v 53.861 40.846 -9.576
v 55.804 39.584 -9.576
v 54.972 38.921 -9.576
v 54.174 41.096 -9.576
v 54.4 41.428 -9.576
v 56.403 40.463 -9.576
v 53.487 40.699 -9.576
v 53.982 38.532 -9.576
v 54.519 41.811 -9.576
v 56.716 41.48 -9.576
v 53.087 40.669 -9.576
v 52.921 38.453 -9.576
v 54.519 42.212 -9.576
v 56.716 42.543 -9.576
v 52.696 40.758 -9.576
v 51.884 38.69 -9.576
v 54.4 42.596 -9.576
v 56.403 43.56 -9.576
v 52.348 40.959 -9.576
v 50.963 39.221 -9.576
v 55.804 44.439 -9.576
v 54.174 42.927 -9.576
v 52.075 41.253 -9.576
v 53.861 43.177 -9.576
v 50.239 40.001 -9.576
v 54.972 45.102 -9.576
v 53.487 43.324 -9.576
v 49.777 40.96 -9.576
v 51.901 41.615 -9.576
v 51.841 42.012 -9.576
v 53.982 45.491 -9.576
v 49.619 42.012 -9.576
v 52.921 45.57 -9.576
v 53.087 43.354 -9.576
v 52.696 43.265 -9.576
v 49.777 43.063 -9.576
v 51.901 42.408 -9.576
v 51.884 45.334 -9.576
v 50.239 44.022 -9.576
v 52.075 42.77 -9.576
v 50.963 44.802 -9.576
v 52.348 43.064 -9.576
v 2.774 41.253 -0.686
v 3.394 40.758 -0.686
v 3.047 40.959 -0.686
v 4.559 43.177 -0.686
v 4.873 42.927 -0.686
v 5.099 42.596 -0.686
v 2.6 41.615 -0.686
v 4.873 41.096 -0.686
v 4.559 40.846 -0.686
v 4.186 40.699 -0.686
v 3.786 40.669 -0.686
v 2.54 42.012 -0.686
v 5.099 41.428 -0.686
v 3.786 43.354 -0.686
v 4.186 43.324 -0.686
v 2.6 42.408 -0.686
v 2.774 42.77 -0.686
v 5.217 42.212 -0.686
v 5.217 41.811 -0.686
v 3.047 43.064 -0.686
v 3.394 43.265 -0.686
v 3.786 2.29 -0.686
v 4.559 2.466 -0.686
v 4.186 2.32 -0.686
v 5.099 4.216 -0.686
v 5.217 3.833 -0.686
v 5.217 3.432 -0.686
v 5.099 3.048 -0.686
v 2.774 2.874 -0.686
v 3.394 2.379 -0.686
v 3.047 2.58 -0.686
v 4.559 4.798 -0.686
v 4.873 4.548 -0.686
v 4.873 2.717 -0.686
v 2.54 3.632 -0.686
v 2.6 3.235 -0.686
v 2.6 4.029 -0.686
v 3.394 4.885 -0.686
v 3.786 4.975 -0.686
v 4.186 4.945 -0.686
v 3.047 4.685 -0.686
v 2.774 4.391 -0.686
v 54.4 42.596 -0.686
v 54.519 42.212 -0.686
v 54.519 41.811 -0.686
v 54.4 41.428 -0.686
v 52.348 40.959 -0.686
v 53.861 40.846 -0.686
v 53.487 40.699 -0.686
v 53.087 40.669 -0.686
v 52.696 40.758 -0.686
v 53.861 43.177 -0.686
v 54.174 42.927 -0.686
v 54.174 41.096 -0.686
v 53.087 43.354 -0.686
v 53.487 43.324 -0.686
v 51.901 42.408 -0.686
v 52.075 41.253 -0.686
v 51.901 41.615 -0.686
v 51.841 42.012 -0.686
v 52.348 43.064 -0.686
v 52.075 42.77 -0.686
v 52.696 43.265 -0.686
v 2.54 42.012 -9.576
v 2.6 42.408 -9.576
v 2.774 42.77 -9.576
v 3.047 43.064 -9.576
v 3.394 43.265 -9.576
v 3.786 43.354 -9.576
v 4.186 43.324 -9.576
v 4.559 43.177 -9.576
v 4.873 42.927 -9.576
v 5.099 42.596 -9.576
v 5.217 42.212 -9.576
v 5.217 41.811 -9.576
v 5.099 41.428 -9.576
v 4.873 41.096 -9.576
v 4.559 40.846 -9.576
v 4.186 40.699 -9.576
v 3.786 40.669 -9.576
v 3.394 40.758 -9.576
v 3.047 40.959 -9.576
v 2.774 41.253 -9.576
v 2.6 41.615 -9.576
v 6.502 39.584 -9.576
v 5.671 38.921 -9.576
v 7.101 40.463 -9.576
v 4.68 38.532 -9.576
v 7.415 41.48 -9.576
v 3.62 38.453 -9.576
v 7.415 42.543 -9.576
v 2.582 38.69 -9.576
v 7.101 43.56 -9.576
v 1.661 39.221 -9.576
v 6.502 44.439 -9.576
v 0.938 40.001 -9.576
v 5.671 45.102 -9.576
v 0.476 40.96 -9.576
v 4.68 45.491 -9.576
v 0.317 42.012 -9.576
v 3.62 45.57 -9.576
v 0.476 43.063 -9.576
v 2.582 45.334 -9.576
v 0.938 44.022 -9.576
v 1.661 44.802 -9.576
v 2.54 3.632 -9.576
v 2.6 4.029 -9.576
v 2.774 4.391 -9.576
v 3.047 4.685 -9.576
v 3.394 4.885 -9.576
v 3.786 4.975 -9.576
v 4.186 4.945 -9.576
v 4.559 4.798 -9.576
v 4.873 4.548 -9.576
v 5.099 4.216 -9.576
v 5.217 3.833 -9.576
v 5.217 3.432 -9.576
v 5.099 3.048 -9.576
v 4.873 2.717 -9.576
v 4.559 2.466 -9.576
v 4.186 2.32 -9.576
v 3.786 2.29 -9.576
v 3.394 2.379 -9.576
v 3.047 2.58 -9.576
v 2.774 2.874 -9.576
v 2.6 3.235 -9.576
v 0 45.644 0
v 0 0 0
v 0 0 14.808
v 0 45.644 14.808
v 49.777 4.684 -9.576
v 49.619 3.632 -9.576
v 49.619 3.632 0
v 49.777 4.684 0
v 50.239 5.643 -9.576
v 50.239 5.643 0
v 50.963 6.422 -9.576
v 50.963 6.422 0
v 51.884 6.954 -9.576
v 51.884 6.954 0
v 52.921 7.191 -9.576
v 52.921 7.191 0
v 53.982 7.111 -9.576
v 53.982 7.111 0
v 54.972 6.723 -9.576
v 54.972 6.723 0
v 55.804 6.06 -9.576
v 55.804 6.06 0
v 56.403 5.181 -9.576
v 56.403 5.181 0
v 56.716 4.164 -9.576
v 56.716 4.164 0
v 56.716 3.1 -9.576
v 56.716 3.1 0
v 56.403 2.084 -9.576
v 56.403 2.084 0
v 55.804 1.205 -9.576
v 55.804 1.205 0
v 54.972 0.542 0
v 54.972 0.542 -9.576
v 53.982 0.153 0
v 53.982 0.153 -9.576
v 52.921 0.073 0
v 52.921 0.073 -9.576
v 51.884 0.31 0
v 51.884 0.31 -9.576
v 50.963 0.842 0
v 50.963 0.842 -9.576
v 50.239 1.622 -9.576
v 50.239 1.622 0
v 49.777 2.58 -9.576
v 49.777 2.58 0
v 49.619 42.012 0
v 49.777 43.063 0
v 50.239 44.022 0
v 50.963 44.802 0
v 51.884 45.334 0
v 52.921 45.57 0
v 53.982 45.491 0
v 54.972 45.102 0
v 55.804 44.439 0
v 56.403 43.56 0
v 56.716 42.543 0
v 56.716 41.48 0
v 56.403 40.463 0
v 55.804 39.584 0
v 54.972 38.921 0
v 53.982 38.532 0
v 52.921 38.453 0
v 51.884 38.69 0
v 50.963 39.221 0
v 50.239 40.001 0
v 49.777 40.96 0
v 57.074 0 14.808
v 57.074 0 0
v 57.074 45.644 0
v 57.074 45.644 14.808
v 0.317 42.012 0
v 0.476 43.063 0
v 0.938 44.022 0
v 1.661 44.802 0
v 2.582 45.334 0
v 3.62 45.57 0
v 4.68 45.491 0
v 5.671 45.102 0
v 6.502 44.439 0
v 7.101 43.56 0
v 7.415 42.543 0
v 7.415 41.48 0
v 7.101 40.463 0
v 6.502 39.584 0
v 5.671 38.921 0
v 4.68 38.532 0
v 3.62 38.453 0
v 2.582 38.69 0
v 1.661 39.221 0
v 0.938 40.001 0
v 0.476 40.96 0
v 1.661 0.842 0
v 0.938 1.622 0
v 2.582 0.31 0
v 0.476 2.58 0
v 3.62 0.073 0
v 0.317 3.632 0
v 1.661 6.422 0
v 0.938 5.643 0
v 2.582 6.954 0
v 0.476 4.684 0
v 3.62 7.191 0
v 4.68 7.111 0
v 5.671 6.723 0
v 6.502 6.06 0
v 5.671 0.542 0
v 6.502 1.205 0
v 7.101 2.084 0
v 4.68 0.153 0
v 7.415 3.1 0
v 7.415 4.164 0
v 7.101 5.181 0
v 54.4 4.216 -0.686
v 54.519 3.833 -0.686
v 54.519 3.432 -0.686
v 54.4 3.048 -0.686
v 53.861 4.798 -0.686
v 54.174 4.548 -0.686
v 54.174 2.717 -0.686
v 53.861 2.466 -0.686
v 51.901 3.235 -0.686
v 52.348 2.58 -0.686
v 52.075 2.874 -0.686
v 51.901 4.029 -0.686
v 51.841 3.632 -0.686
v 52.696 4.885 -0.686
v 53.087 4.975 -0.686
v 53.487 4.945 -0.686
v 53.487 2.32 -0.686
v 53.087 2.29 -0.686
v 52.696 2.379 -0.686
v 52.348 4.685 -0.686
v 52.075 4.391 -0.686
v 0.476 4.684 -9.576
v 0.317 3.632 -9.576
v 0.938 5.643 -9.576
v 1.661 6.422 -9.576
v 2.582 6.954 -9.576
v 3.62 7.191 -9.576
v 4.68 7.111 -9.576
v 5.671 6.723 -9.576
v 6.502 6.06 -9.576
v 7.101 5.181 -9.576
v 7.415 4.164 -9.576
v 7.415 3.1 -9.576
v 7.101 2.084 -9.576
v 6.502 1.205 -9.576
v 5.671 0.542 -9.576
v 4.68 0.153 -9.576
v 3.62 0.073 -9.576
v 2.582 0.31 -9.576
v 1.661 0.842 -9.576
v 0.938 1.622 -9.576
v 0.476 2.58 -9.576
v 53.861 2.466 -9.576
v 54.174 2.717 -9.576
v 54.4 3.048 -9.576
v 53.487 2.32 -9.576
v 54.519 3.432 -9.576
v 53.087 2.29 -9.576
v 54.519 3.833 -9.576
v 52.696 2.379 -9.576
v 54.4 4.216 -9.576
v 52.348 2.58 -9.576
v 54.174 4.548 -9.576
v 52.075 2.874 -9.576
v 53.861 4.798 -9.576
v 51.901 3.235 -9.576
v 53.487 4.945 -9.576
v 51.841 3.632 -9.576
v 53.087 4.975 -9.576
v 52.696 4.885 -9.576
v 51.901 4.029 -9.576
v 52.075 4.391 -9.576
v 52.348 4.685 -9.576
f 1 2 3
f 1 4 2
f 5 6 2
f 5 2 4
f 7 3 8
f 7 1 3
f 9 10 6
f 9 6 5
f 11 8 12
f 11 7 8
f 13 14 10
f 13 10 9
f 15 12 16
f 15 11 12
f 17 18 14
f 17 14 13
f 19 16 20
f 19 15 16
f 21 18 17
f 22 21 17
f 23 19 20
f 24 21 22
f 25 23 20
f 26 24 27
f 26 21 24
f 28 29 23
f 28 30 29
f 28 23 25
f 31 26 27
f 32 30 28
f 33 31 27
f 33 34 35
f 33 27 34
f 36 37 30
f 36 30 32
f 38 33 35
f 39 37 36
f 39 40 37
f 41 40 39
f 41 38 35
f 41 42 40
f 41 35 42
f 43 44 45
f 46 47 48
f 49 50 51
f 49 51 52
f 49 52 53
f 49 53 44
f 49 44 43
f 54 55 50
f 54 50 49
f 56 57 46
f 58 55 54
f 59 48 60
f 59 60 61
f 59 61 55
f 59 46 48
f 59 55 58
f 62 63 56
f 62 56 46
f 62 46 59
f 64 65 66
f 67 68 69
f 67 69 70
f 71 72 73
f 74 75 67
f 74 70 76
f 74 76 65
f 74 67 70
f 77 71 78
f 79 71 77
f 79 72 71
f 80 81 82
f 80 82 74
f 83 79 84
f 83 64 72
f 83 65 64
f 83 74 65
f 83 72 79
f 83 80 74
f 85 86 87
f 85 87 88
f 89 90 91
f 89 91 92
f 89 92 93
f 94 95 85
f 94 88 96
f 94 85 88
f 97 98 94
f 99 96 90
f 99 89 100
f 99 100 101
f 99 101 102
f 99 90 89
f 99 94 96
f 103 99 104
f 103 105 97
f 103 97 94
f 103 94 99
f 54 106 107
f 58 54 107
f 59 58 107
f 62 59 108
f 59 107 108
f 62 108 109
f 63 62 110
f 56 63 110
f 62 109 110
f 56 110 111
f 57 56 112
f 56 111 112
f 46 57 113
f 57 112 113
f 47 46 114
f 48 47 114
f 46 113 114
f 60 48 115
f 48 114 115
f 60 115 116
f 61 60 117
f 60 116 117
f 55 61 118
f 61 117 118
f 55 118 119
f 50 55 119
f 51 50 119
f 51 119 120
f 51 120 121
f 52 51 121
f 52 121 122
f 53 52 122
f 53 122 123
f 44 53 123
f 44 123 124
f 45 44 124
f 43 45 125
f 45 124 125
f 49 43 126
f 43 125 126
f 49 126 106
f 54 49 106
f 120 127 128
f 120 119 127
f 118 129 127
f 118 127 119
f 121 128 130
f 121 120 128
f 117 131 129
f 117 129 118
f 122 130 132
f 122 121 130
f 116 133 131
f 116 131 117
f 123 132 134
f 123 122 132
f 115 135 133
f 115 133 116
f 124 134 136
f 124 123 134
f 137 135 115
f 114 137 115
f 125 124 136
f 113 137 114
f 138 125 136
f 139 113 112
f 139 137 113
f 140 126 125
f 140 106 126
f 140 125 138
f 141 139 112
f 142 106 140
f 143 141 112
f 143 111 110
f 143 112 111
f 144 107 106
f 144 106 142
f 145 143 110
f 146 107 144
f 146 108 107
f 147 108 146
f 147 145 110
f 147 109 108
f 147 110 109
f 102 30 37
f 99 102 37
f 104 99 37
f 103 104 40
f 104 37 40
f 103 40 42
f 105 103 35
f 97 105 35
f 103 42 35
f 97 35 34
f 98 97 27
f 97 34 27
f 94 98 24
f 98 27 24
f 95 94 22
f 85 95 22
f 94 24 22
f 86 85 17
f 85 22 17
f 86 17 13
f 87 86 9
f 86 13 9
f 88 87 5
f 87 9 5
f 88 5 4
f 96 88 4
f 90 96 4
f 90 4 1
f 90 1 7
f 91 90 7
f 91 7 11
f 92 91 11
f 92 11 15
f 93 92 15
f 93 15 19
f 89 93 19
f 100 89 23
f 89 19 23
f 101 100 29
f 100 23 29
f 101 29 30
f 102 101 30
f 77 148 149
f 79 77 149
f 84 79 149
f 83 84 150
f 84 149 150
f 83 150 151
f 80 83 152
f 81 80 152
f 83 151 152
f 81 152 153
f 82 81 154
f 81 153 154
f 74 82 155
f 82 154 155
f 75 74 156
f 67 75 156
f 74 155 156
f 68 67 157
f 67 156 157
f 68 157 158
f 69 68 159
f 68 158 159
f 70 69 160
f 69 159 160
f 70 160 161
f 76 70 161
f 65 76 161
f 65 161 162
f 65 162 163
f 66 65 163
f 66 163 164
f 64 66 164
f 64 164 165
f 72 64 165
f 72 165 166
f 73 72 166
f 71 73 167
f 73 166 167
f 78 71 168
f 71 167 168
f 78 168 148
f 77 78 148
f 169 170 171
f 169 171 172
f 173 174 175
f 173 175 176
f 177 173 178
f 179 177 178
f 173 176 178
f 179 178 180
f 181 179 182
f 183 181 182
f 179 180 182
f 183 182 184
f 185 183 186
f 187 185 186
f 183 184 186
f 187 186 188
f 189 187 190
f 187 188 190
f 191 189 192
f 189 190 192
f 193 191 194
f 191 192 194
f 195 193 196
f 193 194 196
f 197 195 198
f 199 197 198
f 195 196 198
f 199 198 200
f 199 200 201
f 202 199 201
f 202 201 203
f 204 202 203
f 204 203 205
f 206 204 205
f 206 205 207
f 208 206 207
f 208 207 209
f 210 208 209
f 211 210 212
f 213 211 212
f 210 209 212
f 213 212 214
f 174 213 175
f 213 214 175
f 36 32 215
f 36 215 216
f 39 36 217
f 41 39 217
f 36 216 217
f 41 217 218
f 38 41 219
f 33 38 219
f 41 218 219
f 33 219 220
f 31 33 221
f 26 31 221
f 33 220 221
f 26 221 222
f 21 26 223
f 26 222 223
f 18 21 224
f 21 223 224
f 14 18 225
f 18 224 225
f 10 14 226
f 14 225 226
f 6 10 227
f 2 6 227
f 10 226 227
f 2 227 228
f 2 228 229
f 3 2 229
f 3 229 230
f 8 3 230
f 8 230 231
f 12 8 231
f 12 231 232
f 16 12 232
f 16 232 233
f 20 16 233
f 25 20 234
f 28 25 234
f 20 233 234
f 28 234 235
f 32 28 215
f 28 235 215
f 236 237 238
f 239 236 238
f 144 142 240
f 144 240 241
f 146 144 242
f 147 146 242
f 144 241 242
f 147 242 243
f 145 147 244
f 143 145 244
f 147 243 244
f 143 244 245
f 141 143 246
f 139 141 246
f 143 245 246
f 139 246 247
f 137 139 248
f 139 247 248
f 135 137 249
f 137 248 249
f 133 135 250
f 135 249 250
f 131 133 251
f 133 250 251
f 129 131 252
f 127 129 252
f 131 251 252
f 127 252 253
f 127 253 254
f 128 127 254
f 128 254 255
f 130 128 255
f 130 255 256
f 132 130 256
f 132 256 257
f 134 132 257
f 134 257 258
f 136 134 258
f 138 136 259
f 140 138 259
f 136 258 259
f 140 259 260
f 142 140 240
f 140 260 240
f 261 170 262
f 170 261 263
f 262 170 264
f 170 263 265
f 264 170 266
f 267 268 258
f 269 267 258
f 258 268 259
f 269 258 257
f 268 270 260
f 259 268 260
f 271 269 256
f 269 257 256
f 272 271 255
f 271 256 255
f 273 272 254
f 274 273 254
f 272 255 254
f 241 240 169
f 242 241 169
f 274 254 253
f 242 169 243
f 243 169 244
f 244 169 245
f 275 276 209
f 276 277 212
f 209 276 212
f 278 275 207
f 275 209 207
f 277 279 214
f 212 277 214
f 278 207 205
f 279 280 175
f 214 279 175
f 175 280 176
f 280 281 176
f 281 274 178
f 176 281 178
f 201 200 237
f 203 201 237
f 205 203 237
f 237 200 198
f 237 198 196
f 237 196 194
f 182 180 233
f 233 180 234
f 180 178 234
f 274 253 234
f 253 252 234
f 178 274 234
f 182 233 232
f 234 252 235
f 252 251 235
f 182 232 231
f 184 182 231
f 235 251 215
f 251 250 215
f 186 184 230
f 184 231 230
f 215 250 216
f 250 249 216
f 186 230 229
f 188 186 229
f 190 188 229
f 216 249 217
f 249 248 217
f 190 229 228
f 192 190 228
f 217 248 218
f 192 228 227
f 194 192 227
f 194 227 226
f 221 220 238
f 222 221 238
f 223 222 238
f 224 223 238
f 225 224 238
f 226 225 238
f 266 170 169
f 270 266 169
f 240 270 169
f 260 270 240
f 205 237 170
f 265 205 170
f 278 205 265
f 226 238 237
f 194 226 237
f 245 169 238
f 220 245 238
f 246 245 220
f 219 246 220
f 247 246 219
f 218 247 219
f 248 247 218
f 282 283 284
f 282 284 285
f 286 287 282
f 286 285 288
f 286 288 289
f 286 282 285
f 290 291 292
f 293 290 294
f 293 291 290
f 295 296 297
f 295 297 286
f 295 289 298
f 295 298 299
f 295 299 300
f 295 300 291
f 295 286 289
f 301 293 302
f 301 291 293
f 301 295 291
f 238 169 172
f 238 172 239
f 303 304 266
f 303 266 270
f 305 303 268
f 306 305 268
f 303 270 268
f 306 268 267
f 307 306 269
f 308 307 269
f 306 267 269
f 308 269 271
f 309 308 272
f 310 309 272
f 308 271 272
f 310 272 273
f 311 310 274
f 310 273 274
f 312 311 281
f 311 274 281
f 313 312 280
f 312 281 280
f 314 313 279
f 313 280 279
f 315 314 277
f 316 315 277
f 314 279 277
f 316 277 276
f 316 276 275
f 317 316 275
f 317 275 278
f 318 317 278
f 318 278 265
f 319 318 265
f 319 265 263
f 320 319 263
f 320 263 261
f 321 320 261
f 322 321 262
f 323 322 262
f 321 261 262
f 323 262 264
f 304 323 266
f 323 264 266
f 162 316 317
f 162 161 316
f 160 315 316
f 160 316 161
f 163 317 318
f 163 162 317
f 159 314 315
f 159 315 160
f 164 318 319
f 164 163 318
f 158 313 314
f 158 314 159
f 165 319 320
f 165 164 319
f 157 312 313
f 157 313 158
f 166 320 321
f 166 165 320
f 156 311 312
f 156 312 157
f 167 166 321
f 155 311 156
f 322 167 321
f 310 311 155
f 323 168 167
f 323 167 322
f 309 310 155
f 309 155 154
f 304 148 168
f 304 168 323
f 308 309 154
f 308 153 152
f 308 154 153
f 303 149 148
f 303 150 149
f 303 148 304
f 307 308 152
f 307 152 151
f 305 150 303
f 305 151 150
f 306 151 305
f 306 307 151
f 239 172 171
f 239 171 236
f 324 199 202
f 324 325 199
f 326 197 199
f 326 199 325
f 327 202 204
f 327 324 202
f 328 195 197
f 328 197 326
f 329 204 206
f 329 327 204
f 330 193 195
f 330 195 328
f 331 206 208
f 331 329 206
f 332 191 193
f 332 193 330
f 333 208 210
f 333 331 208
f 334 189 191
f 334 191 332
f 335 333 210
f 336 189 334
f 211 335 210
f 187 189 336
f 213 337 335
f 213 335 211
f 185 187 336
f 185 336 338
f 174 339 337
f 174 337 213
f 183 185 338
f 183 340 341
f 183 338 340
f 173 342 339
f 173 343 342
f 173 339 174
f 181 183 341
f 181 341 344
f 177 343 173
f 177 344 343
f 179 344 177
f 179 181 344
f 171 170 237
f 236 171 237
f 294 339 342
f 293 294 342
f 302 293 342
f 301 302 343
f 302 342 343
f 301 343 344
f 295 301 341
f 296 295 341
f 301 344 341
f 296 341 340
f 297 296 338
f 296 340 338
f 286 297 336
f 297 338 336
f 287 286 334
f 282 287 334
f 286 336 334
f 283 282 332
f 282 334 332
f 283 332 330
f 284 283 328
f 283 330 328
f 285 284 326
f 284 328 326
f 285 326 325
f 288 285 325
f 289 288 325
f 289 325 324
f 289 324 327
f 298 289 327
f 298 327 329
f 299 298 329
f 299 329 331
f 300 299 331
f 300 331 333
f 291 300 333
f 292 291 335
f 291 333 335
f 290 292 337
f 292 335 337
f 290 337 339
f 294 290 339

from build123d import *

# Parameters (mm, degrees)
SKETCH1_W           = 57.0738
SKETCH1_H           = 45.6438
BOSS_EXTRUDE1_DEPTH = 14.8082
SKETCH2_R           = 3.5687
BOSS_EXTRUDE2_DEPTH = 9.5758
SKETCH3_R           = 1.3462
CUT_EXTRUDE1_DEPTH  = 8.89


with BuildPart() as part:
    # Sketch1 → Boss-Extrude1 (new body)
    with BuildSketch(Plane.XY):
        with Locations((28.5369, 22.8219)):
            Rectangle(SKETCH1_W, SKETCH1_H)
    extrude(amount=BOSS_EXTRUDE1_DEPTH)

    # Sketch2 → Boss-Extrude2 (add)
    with BuildSketch(Plane(origin=(0, 0, 0), x_dir=(-1, 0, 0), z_dir=(0, 0, -1))):
        with Locations((-3.8862, 42.0116)):
            Circle(SKETCH2_R)
        with Locations((-3.8862, 3.6322)):
            Circle(SKETCH2_R)
        with Locations((-53.1876, 3.6322)):
            Circle(SKETCH2_R)
        with Locations((-53.1876, 42.0116)):
            Circle(SKETCH2_R)
    extrude(amount=BOSS_EXTRUDE2_DEPTH)

    # Sketch3 → Cut-Extrude1 (cut)
    with BuildSketch(Plane(origin=(0, 0, -9.5758), x_dir=(-1, 0, 0), z_dir=(0, 0, -1))):
        with Locations((-3.8862, 3.6322)):
            Circle(SKETCH3_R)
        with Locations((-53.1876, 3.6322)):
            Circle(SKETCH3_R)
        with Locations((-53.1876, 42.0116)):
            Circle(SKETCH3_R)
        with Locations((-3.8862, 42.0116)):
            Circle(SKETCH3_R)
    extrude(amount=-CUT_EXTRUDE1_DEPTH, mode=Mode.SUBTRACT)


solid = part.part
